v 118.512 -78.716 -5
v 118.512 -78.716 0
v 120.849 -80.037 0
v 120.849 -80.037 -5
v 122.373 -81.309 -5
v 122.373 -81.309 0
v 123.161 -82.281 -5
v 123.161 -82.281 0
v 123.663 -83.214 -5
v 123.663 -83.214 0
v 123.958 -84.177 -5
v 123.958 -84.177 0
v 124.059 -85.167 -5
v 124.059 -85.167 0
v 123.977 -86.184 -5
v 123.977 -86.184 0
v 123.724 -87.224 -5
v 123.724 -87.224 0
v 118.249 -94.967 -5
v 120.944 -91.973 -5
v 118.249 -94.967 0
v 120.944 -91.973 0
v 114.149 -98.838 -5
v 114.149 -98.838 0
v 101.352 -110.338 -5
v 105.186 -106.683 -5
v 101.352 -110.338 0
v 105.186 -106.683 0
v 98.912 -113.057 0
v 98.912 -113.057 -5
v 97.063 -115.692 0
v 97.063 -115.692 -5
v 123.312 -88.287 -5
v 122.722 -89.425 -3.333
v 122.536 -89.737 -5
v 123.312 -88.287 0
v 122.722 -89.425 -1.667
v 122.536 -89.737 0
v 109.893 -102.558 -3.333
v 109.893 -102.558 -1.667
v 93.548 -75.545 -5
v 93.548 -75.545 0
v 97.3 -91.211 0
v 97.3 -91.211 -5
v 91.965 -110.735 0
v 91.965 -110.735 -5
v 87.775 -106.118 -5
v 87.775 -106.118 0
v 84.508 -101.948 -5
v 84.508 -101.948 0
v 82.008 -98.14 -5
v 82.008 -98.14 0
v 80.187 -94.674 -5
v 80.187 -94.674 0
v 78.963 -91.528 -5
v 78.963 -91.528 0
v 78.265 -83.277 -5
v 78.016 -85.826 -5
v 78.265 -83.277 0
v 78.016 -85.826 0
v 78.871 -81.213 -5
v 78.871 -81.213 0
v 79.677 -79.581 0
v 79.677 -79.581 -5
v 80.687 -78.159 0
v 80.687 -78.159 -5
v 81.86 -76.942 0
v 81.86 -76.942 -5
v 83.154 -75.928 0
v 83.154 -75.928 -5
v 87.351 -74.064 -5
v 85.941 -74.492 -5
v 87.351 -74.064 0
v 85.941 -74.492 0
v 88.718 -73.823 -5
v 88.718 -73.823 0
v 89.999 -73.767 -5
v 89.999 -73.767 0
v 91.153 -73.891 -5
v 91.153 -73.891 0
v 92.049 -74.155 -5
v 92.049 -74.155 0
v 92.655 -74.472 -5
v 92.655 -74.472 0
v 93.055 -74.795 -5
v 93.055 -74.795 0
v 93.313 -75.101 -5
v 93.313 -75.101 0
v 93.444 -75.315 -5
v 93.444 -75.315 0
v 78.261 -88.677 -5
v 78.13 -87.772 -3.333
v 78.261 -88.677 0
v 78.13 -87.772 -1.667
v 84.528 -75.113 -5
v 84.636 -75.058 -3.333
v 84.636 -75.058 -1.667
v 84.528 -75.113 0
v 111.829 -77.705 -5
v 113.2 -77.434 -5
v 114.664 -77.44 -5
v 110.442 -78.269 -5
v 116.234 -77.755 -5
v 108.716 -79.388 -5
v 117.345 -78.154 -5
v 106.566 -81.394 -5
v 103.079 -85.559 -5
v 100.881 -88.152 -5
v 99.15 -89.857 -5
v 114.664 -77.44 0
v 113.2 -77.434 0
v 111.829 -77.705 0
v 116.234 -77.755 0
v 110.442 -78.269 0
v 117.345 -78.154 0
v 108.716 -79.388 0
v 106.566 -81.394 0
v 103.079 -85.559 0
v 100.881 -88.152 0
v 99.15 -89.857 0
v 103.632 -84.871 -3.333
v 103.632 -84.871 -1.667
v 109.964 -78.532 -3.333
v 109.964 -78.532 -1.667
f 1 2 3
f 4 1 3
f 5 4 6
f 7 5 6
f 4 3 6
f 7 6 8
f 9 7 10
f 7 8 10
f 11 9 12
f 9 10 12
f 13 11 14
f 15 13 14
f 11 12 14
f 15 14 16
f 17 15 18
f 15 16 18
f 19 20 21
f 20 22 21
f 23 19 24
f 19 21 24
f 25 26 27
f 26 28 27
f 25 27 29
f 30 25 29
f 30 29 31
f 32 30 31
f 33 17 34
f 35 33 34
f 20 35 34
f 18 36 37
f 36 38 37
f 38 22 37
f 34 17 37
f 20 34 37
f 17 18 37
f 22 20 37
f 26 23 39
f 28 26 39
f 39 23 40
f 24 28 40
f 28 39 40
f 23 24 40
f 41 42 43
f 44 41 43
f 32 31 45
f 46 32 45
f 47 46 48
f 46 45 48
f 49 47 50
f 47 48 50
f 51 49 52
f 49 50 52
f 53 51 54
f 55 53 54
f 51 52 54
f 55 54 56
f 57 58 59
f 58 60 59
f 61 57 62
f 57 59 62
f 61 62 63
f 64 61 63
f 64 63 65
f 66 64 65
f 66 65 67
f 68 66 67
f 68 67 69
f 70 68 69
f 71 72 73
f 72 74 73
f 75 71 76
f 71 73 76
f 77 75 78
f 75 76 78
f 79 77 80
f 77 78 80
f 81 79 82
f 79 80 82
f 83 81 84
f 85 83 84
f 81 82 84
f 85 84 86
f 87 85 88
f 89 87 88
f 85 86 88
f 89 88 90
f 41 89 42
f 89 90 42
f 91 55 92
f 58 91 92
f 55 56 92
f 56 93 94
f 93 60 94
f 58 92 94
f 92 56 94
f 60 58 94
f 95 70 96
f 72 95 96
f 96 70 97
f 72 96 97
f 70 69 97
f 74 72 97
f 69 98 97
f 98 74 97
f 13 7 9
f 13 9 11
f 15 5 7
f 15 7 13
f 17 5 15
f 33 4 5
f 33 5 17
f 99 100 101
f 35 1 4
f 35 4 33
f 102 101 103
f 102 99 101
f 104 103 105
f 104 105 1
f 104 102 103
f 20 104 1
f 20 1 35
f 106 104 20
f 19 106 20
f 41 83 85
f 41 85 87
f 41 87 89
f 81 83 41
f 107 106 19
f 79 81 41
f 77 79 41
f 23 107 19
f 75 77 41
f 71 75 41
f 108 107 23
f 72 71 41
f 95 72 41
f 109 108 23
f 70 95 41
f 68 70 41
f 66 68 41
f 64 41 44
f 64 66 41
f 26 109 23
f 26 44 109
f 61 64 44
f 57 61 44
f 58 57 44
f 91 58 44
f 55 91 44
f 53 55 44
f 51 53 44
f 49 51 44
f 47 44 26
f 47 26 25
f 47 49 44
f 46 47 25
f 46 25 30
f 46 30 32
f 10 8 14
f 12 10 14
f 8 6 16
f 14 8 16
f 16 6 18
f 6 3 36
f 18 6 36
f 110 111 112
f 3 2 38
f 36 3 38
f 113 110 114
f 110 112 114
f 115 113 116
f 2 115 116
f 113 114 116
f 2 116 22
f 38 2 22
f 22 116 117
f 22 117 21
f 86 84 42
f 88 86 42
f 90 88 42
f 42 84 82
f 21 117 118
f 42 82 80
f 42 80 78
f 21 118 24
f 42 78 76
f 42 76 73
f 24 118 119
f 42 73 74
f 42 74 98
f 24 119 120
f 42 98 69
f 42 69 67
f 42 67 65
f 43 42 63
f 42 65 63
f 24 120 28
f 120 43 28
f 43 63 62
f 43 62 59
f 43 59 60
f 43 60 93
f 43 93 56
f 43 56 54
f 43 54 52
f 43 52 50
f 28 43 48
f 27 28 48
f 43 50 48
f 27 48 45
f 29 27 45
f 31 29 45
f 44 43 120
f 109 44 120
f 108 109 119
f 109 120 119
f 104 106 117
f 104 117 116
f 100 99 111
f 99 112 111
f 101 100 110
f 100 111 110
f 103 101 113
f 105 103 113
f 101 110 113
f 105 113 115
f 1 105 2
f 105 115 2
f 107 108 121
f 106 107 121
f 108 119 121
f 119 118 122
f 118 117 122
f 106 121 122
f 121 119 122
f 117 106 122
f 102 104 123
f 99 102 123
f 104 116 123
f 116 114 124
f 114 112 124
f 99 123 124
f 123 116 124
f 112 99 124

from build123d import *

# Parameters (mm, degrees)
CYLINDER_R     = 2
CYLINDER_DEPTH = 10
EXTRUDE_DEPTH  = 5


with BuildPart() as cylinder:
    # Cylinder → Cylinder (new body)
    with BuildSketch(Plane(origin=(116, -84, 0), x_dir=(1, 0, 0), z_dir=(0, 0, 1))):
        Circle(CYLINDER_R)
    extrude(amount=CYLINDER_DEPTH)


with BuildPart() as cut:
    # path1 → Extrude (new body)
    with BuildSketch(Plane(origin=(99.607537, -92.40898, 0), x_dir=(0, -1, 0), z_dir=(0, 0, -1))):
        with BuildLine():
            add(Edge.make_bspline(
                [(23.28275, 2.544127), (-12.908217, 41.876502), (-23.28275, 8.495963), (-16.864265, 6.059608)],
                knots=[0, 0, 0, 0, 1, 1, 1, 1], degree=3))
            add(Edge.make_bspline(
                [(-16.864265, 6.059608), (-1.198284, 2.30756)],
                knots=[0, 0, 16.109029, 16.109029], degree=1))
            add(Edge.make_bspline(
                [(-1.198284, 2.30756), (-5.363195, -4.763193), (-19.313207, -8.510453), (-13.693016, -18.904693)],
                knots=[0, 0, 0, 0, 1, 1, 1, 1], degree=3))
            add(Edge.make_bspline(
                [(-13.693016, -18.904693), (-5.004596, -37.313343), (10.95749, -4.605483), (23.28275, 2.544127)],
                knots=[0, 0, 0, 0, 1, 1, 1, 1], degree=3))
        make_face()
    extrude(amount=EXTRUDE_DEPTH)

    # Cut: cut Cylinder
    add(cylinder.part, mode=Mode.SUBTRACT)


solid = cut.part
